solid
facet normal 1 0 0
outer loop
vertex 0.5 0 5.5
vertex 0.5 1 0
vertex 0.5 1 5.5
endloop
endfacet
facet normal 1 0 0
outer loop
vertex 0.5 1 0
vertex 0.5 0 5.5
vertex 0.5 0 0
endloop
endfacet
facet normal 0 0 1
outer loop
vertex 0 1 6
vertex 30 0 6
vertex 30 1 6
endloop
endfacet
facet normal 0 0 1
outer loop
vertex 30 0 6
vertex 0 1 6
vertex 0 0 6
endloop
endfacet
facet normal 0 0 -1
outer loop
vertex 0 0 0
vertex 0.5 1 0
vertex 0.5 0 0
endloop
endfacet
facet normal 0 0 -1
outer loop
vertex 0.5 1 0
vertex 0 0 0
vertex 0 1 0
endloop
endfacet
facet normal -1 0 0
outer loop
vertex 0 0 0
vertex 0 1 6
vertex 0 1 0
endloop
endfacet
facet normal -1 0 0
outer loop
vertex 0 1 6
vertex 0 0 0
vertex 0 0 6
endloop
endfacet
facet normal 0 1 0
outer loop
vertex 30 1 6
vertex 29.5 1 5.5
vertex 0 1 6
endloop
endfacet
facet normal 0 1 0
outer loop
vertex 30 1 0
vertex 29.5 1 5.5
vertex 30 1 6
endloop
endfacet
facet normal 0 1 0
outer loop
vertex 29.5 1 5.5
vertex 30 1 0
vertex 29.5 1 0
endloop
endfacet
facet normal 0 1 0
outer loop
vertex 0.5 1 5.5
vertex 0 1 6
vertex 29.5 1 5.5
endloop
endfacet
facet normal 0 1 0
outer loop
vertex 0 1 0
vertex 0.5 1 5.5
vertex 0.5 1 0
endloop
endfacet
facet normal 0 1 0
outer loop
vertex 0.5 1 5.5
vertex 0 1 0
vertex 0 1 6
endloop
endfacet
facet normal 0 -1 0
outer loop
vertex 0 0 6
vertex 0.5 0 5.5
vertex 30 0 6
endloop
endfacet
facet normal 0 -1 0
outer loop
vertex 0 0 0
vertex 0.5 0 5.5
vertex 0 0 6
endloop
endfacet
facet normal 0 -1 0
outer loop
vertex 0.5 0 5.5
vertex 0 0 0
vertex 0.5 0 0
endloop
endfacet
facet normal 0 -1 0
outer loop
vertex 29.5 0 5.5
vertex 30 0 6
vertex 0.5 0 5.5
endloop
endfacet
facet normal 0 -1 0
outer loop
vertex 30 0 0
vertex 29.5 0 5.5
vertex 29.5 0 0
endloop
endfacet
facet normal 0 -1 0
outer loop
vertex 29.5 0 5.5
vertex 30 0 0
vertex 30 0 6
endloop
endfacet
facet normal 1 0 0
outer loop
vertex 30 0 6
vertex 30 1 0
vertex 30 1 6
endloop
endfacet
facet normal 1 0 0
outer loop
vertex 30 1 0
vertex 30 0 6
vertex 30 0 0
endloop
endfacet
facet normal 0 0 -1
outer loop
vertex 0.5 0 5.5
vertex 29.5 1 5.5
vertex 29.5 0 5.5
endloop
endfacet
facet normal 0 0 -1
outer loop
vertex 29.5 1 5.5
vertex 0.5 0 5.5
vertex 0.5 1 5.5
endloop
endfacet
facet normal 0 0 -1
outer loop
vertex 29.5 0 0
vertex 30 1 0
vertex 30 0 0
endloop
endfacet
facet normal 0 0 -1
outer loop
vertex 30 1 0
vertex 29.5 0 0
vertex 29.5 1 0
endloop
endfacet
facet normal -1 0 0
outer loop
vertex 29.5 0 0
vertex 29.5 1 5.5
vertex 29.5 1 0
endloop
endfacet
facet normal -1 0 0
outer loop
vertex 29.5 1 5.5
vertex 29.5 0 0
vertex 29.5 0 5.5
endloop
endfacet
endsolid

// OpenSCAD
$fn = 100;

bridgeWidth = 30;
bridgeHeight = 6;

module bridge() {
    color([0.2,0.2,0.2]) {
    cube([0.5,1,bridgeHeight]);
    translate([0,0,bridgeHeight-0.5]) cube([bridgeWidth,1,0.5]);
    translate([bridgeWidth-0.5,0,0])cube([0.5,1,bridgeHeight]);
    }
}

bridge();
